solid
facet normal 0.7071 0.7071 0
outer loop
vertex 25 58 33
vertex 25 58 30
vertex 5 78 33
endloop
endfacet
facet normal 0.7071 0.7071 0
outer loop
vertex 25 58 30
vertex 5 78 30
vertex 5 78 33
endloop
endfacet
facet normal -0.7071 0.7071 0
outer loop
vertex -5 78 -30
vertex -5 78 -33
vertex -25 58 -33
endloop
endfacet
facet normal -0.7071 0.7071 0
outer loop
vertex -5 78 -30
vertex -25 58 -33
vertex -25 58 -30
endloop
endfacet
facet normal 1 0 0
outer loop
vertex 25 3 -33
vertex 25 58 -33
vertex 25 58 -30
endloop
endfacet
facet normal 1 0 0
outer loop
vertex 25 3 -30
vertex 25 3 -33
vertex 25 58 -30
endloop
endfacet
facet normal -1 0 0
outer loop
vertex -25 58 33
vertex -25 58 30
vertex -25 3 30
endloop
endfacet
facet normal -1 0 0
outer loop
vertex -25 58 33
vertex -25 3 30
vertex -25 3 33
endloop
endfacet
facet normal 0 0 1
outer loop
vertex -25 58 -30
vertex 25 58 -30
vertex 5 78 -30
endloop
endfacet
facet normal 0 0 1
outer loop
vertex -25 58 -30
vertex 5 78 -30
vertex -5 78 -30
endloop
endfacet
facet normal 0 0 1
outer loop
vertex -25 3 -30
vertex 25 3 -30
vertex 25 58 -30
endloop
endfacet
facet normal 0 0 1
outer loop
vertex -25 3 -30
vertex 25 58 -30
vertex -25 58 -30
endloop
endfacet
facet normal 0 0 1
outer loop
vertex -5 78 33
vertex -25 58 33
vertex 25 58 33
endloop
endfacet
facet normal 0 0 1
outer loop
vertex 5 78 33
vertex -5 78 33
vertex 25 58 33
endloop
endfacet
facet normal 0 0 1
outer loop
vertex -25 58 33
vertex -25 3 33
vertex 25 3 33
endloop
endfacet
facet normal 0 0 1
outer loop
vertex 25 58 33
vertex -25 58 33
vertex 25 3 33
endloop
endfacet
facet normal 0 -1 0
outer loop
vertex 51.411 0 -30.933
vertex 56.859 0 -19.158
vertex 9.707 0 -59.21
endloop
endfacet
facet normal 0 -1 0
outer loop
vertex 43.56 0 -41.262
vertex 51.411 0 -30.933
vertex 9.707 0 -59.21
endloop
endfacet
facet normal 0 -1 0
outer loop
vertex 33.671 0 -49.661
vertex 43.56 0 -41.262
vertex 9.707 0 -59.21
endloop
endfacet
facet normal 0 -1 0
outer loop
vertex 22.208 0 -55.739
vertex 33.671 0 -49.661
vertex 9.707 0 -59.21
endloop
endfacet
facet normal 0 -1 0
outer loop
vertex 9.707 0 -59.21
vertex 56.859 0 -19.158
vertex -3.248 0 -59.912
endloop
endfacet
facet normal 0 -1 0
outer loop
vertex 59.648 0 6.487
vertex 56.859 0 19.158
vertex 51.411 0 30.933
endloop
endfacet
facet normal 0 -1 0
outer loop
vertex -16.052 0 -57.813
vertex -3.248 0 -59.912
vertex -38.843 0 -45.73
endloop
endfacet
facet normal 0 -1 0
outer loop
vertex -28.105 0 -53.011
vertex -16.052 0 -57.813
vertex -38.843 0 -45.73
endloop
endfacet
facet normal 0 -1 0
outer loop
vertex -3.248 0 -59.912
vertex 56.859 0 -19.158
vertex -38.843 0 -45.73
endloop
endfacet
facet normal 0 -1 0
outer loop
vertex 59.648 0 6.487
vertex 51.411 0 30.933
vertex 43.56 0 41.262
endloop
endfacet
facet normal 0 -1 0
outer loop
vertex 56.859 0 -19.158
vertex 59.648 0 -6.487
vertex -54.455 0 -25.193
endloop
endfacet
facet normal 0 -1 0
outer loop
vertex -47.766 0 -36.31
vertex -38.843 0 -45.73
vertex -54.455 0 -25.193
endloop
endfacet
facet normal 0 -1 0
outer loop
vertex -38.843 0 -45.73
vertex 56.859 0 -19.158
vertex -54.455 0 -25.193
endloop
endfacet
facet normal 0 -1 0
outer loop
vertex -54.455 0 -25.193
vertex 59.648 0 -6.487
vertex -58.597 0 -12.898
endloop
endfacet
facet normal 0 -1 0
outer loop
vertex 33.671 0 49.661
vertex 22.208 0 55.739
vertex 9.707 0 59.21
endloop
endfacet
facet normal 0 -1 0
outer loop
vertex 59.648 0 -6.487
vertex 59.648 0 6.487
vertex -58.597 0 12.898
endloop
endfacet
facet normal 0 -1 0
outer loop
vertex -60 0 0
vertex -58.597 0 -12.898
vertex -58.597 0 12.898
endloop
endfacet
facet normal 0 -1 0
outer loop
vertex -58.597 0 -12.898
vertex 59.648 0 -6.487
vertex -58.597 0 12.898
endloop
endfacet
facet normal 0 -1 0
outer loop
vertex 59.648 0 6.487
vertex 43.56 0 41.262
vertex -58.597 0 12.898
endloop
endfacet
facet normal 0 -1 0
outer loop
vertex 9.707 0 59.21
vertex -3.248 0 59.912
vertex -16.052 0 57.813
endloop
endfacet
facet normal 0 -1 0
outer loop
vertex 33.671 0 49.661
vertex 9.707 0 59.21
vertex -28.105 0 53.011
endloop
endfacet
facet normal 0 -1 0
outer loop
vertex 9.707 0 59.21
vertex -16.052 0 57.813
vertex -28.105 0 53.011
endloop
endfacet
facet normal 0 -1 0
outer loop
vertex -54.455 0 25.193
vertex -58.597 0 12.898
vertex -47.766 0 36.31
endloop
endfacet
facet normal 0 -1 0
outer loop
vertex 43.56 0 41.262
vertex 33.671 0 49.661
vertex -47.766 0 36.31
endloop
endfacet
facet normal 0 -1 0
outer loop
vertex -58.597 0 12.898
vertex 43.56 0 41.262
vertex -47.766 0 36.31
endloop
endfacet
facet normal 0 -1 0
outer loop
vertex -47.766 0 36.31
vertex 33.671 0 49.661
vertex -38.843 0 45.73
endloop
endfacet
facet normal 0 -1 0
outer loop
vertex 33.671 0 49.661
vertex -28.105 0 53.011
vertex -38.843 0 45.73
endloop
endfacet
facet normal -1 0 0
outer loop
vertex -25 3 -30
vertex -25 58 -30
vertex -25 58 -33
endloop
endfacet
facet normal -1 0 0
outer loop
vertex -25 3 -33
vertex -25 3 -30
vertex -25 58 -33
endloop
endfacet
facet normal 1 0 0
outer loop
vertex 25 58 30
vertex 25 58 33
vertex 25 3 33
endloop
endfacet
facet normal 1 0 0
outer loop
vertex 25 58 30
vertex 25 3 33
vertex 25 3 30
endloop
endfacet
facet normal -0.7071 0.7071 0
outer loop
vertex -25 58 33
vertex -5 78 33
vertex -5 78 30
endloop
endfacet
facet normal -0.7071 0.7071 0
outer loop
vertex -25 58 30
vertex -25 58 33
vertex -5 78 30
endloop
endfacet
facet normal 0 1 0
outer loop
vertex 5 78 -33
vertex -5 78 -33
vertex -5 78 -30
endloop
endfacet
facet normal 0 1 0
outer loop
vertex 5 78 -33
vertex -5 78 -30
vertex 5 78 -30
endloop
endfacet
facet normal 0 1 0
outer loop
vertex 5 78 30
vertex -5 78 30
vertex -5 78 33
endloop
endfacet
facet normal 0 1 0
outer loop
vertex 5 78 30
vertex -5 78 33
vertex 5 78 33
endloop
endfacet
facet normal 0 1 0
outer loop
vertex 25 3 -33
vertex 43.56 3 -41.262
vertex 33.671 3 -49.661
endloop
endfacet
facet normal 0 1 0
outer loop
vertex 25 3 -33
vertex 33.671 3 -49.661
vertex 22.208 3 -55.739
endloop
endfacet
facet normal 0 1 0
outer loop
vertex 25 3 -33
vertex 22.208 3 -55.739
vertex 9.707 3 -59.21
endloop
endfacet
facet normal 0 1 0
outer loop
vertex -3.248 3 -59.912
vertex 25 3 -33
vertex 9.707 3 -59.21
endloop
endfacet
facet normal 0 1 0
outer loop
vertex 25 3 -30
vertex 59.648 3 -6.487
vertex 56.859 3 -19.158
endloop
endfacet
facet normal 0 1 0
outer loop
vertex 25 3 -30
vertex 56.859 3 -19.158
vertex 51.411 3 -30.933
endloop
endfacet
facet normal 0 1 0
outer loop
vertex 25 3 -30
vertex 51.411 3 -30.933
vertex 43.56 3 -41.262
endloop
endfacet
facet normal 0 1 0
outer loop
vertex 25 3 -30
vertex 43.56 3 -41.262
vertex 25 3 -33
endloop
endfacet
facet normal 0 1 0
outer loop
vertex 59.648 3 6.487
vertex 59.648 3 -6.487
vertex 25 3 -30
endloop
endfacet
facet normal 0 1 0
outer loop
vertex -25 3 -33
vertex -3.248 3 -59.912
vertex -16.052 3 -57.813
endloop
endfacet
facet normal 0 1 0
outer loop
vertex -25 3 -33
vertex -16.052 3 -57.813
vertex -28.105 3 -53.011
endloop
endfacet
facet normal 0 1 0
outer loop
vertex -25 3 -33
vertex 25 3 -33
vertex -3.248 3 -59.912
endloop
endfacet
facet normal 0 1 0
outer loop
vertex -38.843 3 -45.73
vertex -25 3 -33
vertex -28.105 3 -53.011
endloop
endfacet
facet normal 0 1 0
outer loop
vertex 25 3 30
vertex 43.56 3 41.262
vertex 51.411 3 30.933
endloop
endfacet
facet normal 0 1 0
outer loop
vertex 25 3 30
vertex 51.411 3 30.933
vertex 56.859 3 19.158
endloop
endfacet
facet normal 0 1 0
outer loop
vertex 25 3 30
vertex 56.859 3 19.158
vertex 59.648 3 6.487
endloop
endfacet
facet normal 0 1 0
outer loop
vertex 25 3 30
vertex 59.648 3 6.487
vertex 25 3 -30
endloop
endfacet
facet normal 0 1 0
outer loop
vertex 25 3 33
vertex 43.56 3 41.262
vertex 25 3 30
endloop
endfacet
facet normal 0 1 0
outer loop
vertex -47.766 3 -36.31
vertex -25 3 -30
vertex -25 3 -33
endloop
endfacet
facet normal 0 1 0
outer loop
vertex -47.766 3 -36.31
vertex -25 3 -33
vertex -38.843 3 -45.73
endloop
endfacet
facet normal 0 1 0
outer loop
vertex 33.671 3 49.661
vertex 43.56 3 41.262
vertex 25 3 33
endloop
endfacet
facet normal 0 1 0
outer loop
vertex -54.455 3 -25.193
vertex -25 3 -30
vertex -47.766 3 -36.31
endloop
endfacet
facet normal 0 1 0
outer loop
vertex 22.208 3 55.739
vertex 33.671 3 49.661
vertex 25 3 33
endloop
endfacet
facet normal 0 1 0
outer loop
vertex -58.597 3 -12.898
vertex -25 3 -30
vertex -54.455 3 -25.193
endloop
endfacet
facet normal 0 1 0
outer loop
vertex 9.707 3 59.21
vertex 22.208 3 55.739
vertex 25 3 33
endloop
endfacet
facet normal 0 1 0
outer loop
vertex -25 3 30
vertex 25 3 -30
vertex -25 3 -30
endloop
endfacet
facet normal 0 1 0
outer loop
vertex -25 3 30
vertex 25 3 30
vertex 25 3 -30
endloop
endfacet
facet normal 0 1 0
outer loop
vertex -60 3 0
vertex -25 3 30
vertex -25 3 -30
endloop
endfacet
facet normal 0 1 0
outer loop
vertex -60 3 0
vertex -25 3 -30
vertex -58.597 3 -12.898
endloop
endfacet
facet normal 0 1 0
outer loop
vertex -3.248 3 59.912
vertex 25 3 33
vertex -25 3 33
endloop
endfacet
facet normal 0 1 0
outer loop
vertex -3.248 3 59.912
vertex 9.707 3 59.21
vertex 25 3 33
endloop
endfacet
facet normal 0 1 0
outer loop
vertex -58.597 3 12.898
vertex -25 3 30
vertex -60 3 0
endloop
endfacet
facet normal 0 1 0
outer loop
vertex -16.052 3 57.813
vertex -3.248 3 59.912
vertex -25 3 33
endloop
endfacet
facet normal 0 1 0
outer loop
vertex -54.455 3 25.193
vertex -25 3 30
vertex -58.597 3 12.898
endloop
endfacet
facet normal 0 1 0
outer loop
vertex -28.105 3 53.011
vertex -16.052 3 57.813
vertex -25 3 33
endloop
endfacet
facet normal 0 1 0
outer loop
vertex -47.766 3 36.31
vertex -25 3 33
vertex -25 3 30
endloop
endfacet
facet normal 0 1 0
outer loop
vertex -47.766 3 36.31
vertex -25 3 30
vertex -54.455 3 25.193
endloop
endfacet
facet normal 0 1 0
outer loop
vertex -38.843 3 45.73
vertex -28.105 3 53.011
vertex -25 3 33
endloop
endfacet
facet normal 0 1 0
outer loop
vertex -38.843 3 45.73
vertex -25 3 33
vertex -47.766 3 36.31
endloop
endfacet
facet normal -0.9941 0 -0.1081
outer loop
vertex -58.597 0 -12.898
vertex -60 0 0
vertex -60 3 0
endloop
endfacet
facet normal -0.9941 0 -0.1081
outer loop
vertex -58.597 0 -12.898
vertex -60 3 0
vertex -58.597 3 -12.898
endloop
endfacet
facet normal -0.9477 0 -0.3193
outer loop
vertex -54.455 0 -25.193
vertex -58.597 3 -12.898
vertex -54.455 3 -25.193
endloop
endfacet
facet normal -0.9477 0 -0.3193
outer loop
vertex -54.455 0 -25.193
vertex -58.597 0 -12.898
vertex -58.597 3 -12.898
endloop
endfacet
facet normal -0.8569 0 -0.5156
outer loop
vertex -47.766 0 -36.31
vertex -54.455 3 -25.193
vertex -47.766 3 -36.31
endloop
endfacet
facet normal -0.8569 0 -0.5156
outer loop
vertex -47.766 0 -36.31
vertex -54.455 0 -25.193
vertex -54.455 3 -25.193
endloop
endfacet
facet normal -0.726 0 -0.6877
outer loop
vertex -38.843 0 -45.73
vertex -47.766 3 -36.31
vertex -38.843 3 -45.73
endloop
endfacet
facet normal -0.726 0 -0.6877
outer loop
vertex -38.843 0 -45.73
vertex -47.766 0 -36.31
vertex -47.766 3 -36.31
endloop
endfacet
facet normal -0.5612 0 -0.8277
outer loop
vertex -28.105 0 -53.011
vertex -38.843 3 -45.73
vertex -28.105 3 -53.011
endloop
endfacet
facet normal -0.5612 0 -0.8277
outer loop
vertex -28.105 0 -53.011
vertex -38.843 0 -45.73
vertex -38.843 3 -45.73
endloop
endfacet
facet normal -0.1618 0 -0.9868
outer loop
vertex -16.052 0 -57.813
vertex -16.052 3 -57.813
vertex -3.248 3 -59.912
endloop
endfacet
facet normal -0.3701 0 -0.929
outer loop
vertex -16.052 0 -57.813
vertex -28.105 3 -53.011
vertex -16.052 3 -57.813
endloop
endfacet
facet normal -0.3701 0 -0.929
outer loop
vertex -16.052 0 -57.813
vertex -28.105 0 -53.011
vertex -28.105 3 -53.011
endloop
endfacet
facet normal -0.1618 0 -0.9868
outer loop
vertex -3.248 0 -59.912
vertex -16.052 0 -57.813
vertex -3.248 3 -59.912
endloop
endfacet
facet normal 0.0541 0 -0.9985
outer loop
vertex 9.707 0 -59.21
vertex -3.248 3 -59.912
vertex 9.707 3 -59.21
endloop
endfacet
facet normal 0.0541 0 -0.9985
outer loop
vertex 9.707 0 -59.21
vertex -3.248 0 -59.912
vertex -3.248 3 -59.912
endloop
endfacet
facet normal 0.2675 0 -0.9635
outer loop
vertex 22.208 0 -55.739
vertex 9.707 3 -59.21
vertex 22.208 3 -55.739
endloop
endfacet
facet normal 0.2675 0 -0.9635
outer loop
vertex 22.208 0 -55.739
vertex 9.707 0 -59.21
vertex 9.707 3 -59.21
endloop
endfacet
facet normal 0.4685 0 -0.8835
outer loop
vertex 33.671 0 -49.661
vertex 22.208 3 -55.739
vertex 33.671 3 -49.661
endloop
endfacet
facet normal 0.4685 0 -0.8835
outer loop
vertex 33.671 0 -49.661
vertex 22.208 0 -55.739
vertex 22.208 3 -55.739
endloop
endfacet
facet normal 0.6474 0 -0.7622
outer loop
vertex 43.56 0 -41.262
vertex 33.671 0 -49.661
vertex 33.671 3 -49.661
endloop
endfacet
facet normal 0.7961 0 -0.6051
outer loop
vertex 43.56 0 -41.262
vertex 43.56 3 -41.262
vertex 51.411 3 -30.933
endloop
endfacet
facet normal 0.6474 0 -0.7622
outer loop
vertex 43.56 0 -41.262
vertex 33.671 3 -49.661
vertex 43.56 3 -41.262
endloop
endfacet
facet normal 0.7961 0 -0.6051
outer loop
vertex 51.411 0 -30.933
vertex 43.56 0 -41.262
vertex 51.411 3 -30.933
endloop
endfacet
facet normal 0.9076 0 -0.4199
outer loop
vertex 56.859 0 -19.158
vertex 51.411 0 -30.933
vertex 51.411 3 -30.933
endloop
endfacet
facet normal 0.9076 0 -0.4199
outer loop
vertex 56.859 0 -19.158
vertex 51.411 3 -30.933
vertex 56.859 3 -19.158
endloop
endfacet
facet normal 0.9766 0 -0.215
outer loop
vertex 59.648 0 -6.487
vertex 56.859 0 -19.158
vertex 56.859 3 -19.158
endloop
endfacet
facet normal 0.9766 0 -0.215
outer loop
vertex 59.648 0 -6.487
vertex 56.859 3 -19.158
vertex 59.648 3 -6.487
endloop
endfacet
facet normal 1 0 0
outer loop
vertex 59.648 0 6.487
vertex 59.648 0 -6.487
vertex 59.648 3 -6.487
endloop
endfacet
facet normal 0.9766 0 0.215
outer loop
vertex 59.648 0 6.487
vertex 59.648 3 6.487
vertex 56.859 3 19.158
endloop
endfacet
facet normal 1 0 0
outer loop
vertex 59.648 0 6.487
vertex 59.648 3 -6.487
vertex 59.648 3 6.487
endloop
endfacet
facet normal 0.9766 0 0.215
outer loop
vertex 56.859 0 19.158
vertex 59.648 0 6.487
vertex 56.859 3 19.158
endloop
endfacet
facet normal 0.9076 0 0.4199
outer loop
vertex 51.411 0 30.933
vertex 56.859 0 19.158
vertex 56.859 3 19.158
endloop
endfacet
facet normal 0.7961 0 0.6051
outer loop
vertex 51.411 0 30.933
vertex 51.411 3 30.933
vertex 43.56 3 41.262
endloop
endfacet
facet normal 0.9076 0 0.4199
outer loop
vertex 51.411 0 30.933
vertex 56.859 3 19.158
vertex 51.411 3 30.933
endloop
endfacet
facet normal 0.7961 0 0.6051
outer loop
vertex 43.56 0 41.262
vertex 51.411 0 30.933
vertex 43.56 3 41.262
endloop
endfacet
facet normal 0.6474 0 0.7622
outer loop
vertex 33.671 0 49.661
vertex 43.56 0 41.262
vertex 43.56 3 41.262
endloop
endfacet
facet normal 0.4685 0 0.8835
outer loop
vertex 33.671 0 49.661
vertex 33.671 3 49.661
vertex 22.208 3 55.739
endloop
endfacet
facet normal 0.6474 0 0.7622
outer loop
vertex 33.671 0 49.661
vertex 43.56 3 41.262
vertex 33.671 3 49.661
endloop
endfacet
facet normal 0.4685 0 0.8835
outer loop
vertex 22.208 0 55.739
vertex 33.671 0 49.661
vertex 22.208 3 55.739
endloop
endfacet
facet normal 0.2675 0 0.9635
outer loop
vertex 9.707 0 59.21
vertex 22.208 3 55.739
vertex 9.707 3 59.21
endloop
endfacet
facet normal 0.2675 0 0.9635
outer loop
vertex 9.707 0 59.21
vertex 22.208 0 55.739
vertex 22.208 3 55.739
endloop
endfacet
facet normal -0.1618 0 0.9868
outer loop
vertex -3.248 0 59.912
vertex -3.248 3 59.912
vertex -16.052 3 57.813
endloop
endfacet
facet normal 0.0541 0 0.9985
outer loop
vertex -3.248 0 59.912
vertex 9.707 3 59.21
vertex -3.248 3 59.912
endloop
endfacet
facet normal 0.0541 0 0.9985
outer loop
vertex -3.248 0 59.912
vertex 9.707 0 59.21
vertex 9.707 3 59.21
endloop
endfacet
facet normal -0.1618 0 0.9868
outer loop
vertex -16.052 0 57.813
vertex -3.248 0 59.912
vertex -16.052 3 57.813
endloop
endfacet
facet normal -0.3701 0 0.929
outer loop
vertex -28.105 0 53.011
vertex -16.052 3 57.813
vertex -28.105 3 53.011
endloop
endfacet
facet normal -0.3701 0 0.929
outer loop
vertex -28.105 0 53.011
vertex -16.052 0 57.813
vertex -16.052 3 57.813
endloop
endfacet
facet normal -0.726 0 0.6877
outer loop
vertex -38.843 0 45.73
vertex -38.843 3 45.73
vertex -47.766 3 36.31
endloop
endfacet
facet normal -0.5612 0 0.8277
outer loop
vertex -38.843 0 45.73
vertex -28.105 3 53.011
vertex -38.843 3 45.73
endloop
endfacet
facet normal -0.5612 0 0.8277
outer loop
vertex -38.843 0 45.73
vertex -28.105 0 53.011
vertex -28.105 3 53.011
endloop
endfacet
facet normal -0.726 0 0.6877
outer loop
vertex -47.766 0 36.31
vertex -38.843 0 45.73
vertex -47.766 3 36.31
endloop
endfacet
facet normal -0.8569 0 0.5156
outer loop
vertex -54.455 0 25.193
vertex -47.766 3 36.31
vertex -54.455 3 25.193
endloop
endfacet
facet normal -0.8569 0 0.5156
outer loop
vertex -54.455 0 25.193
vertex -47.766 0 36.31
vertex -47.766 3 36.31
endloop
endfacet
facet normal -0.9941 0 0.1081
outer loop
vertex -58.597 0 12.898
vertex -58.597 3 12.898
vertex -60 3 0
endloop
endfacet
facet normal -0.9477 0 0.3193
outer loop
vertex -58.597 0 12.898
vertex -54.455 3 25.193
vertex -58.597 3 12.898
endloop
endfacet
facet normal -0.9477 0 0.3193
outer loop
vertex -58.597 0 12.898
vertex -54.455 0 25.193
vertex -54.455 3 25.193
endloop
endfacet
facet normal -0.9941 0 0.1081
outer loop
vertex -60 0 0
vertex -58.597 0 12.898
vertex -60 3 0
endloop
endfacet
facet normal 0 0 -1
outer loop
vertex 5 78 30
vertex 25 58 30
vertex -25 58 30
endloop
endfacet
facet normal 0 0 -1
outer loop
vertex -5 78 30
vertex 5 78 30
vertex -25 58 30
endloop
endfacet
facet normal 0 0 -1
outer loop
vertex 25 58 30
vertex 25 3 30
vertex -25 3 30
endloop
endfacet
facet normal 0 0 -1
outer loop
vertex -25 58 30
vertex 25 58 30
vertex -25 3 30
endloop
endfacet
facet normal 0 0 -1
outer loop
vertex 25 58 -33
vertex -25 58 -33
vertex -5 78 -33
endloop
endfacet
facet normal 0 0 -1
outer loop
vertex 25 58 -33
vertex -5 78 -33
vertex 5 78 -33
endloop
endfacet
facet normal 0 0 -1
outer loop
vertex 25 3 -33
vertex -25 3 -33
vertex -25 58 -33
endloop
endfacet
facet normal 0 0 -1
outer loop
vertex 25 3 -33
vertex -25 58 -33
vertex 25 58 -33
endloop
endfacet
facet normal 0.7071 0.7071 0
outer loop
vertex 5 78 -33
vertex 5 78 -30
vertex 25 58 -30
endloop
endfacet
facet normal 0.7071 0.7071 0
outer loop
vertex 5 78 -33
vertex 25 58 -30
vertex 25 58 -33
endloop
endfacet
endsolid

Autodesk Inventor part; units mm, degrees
ref_plane "YZ Plane" through (0, 0, 0) normal (1, 0, 0) x (0, 1, 0)
ref_plane "XZ Plane" through (0, 0, 0) normal (0, 1, 0) x (-1, 0, 0)
ref_plane "XY Plane" through (0, 0, 0) normal (0, 0, 1) x (1, 0, 0)
sketch "Esquisse1" plane through (0, 0, 0) normal (0, 1, 0) x (-1, 0, 0)
  circle A0 centre (0, 0) radius 60
  dimension "d0" = 120
extrude "Extrusion1" add sketch "Esquisse1" along normal blind 3
sketch "Esquisse2" plane through (0, 3, 0) normal (0, 1, 0) x (1, 0, 0)
  line L0 (-25, -33) -> (25, -33)
  line L1 (25, -33) -> (25, -30)
  line L2 (25, -30) -> (-25, -30)
  line L3 (-25, -30) -> (-25, -33)
  line L4 (-25, 33) -> (25, 33)
  line L5 (25, 33) -> (25, 30)
  line L6 (25, 30) -> (-25, 30)
  line L7 (-25, 30) -> (-25, 33)
  point P0 (0, 0)
  dimension "d3" = 50
  dimension "d4" = 50
  dimension "d5" = 30
  dimension "d7" = 30
  dimension "d8" = 3
  dimension "d9" = 3
  dimension "d10" = 25
extrude "Extrusion2" add sketch "Esquisse2" along normal blind 75
chamfer "Chanfrein1" distance 20 angle 45 4 edges at (25, 78, 31.5) (25, 78, -31.5) (-25, 78, -31.5) (-25, 78, 31.5)
properties part number "Bras principal"
